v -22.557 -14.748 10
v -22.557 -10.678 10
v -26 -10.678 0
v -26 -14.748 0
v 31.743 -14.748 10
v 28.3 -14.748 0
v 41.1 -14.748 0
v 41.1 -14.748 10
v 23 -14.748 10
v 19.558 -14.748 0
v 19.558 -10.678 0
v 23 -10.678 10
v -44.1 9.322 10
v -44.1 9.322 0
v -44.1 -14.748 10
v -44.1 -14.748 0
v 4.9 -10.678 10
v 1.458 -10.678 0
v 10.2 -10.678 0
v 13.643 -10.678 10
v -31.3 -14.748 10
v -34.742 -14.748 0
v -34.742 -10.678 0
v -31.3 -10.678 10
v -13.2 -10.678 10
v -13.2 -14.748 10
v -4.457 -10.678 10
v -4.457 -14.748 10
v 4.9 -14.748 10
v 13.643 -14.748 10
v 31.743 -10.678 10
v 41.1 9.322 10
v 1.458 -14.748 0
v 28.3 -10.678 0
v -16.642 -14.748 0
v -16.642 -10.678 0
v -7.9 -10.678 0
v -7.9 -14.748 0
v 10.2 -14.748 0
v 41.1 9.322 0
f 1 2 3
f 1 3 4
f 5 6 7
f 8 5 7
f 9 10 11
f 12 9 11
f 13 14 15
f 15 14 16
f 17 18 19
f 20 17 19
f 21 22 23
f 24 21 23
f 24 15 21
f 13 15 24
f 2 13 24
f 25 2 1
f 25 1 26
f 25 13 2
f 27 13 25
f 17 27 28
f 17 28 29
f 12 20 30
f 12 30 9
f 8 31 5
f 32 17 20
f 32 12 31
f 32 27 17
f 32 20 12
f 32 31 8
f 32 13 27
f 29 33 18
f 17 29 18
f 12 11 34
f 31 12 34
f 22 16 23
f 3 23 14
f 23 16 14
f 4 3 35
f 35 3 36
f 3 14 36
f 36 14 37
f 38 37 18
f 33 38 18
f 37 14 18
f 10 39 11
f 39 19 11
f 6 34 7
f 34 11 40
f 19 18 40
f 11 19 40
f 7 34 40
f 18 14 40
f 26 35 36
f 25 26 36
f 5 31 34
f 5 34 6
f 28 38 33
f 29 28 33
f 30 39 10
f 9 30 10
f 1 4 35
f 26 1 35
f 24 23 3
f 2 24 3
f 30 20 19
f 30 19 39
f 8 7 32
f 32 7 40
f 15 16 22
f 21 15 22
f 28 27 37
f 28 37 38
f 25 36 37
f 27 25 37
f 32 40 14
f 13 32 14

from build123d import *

# Parameters (mm, degrees)
F1_DEPTH = 10
F2_SIZE2 = 3.442485
F2_SIZE  = 9.99999
F3_SIZE2 = 3.442485
F3_SIZE  = 9.99999
F4_SIZE2 = 3.442485
F4_SIZE  = 9.99999
F5_SIZE2 = 3.442485
F5_SIZE  = 9.99999
F6_SIZE2 = 3.442485
F6_SIZE  = 9.99999
F7_SIZE2 = 3.442485
F7_SIZE  = 9.99999
F8_SIZE2 = 3.442485
F8_SIZE  = 9.99999
F9_SIZE2 = 3.442485
F9_SIZE  = 9.99999


# Not quite as in the source:
# - a fillet or chamfer is up to 0.001 mm smaller than in the source, because OpenCascade refuses the exact size


with BuildPart() as f1:
    # F0 (on Top) → F1 (new body)
    with BuildSketch(Plane.XY):
        Polygon((41.1003320895, 9.3217377585), (-44.0996679105, 9.3217377585), (-44.0996679105, -10.6782622415), (-44.0996679105, -14.7482622415), (-31.2996679105, -14.7482622415), (-31.2996679105, -10.6782622415), (-25.9996679105, -10.6782622415), (-25.9996679105, -14.7482622415), (-13.1996679105, -14.7482622415), (-13.1996679105, -10.6782622415), (-7.8996679105, -10.6782622415), (-7.8996679105, -14.7482622415), (4.9003320895, -14.7482622415), (4.9003320895, -10.6782622415), (10.2003320895, -10.6782622415), (10.2003320895, -14.7482622415), (23.0003320895, -14.7482622415), (23.0003320895, -10.6782622415), (28.3003320895, -10.6782622415), (28.3003320895, -14.7482622415), (41.1003320895, -14.7482622415), (41.1003320895, -10.6782622415), align=None)
    extrude(amount=F1_DEPTH)

    # F2 (size 10 and 3.4424952484 in the source; OpenCascade refuses exactly that, so slightly less here)
    f2_edges = [f1.edges().sort_by_distance(p)[0] for p in [
        (-31.299668, -12.713262, 0),
    ]]
    f2_side = f1.faces().sort_by_distance((-31.299668, -12.713262, 5))[0]
    chamfer(f2_edges, length=F2_SIZE, length2=F2_SIZE2, reference=f2_side)

    # F3 (size 10 and 3.4424952484 in the source; OpenCascade refuses exactly that, so slightly less here)
    f3_edges = [f1.edges().sort_by_distance(p)[0] for p in [
        (-25.999668, -12.713262, 10),
    ]]
    f3_side = f1.faces().sort_by_distance((-25.999668, -12.713262, 5))[0]
    chamfer(f3_edges, length=F3_SIZE, length2=F3_SIZE2, reference=f3_side)

    # F4 (size 10 and 3.4424952484 in the source; OpenCascade refuses exactly that, so slightly less here)
    f4_edges = [f1.edges().sort_by_distance(p)[0] for p in [
        (-13.199668, -12.713262, 0),
    ]]
    f4_side = f1.faces().sort_by_distance((-13.199668, -12.713262, 5))[0]
    chamfer(f4_edges, length=F4_SIZE, length2=F4_SIZE2, reference=f4_side)

    # F5 (size 10 and 3.4424952484 in the source; OpenCascade refuses exactly that, so slightly less here)
    f5_edges = [f1.edges().sort_by_distance(p)[0] for p in [
        (-7.899668, -12.713262, 10),
    ]]
    f5_side = f1.faces().sort_by_distance((-7.899668, -12.713262, 5))[0]
    chamfer(f5_edges, length=F5_SIZE, length2=F5_SIZE2, reference=f5_side)

    # F6 (size 10 and 3.4424952484 in the source; OpenCascade refuses exactly that, so slightly less here)
    f6_edges = [f1.edges().sort_by_distance(p)[0] for p in [
        (4.900332, -12.713262, 0),
    ]]
    f6_side = f1.faces().sort_by_distance((4.900332, -12.713262, 5))[0]
    chamfer(f6_edges, length=F6_SIZE, length2=F6_SIZE2, reference=f6_side)

    # F7 (size 10 and 3.4424952484 in the source; OpenCascade refuses exactly that, so slightly less here)
    f7_edges = [f1.edges().sort_by_distance(p)[0] for p in [
        (10.200332, -12.713262, 10),
    ]]
    f7_side = f1.faces().sort_by_distance((10.200332, -12.713262, 5))[0]
    chamfer(f7_edges, length=F7_SIZE, length2=F7_SIZE2, reference=f7_side)

    # F8 (size 10 and 3.4424952484 in the source; OpenCascade refuses exactly that, so slightly less here)
    f8_edges = [f1.edges().sort_by_distance(p)[0] for p in [
        (23.000332, -12.713262, 0),
    ]]
    f8_side = f1.faces().sort_by_distance((23.000332, -12.713262, 5))[0]
    chamfer(f8_edges, length=F8_SIZE, length2=F8_SIZE2, reference=f8_side)

    # F9 (size 10 and 3.4424952484 in the source; OpenCascade refuses exactly that, so slightly less here)
    f9_edges = [f1.edges().sort_by_distance(p)[0] for p in [
        (28.300332, -12.713262, 10),
    ]]
    f9_side = f1.faces().sort_by_distance((28.300332, -12.713262, 5))[0]
    chamfer(f9_edges, length=F9_SIZE, length2=F9_SIZE2, reference=f9_side)


solid = f1.part
